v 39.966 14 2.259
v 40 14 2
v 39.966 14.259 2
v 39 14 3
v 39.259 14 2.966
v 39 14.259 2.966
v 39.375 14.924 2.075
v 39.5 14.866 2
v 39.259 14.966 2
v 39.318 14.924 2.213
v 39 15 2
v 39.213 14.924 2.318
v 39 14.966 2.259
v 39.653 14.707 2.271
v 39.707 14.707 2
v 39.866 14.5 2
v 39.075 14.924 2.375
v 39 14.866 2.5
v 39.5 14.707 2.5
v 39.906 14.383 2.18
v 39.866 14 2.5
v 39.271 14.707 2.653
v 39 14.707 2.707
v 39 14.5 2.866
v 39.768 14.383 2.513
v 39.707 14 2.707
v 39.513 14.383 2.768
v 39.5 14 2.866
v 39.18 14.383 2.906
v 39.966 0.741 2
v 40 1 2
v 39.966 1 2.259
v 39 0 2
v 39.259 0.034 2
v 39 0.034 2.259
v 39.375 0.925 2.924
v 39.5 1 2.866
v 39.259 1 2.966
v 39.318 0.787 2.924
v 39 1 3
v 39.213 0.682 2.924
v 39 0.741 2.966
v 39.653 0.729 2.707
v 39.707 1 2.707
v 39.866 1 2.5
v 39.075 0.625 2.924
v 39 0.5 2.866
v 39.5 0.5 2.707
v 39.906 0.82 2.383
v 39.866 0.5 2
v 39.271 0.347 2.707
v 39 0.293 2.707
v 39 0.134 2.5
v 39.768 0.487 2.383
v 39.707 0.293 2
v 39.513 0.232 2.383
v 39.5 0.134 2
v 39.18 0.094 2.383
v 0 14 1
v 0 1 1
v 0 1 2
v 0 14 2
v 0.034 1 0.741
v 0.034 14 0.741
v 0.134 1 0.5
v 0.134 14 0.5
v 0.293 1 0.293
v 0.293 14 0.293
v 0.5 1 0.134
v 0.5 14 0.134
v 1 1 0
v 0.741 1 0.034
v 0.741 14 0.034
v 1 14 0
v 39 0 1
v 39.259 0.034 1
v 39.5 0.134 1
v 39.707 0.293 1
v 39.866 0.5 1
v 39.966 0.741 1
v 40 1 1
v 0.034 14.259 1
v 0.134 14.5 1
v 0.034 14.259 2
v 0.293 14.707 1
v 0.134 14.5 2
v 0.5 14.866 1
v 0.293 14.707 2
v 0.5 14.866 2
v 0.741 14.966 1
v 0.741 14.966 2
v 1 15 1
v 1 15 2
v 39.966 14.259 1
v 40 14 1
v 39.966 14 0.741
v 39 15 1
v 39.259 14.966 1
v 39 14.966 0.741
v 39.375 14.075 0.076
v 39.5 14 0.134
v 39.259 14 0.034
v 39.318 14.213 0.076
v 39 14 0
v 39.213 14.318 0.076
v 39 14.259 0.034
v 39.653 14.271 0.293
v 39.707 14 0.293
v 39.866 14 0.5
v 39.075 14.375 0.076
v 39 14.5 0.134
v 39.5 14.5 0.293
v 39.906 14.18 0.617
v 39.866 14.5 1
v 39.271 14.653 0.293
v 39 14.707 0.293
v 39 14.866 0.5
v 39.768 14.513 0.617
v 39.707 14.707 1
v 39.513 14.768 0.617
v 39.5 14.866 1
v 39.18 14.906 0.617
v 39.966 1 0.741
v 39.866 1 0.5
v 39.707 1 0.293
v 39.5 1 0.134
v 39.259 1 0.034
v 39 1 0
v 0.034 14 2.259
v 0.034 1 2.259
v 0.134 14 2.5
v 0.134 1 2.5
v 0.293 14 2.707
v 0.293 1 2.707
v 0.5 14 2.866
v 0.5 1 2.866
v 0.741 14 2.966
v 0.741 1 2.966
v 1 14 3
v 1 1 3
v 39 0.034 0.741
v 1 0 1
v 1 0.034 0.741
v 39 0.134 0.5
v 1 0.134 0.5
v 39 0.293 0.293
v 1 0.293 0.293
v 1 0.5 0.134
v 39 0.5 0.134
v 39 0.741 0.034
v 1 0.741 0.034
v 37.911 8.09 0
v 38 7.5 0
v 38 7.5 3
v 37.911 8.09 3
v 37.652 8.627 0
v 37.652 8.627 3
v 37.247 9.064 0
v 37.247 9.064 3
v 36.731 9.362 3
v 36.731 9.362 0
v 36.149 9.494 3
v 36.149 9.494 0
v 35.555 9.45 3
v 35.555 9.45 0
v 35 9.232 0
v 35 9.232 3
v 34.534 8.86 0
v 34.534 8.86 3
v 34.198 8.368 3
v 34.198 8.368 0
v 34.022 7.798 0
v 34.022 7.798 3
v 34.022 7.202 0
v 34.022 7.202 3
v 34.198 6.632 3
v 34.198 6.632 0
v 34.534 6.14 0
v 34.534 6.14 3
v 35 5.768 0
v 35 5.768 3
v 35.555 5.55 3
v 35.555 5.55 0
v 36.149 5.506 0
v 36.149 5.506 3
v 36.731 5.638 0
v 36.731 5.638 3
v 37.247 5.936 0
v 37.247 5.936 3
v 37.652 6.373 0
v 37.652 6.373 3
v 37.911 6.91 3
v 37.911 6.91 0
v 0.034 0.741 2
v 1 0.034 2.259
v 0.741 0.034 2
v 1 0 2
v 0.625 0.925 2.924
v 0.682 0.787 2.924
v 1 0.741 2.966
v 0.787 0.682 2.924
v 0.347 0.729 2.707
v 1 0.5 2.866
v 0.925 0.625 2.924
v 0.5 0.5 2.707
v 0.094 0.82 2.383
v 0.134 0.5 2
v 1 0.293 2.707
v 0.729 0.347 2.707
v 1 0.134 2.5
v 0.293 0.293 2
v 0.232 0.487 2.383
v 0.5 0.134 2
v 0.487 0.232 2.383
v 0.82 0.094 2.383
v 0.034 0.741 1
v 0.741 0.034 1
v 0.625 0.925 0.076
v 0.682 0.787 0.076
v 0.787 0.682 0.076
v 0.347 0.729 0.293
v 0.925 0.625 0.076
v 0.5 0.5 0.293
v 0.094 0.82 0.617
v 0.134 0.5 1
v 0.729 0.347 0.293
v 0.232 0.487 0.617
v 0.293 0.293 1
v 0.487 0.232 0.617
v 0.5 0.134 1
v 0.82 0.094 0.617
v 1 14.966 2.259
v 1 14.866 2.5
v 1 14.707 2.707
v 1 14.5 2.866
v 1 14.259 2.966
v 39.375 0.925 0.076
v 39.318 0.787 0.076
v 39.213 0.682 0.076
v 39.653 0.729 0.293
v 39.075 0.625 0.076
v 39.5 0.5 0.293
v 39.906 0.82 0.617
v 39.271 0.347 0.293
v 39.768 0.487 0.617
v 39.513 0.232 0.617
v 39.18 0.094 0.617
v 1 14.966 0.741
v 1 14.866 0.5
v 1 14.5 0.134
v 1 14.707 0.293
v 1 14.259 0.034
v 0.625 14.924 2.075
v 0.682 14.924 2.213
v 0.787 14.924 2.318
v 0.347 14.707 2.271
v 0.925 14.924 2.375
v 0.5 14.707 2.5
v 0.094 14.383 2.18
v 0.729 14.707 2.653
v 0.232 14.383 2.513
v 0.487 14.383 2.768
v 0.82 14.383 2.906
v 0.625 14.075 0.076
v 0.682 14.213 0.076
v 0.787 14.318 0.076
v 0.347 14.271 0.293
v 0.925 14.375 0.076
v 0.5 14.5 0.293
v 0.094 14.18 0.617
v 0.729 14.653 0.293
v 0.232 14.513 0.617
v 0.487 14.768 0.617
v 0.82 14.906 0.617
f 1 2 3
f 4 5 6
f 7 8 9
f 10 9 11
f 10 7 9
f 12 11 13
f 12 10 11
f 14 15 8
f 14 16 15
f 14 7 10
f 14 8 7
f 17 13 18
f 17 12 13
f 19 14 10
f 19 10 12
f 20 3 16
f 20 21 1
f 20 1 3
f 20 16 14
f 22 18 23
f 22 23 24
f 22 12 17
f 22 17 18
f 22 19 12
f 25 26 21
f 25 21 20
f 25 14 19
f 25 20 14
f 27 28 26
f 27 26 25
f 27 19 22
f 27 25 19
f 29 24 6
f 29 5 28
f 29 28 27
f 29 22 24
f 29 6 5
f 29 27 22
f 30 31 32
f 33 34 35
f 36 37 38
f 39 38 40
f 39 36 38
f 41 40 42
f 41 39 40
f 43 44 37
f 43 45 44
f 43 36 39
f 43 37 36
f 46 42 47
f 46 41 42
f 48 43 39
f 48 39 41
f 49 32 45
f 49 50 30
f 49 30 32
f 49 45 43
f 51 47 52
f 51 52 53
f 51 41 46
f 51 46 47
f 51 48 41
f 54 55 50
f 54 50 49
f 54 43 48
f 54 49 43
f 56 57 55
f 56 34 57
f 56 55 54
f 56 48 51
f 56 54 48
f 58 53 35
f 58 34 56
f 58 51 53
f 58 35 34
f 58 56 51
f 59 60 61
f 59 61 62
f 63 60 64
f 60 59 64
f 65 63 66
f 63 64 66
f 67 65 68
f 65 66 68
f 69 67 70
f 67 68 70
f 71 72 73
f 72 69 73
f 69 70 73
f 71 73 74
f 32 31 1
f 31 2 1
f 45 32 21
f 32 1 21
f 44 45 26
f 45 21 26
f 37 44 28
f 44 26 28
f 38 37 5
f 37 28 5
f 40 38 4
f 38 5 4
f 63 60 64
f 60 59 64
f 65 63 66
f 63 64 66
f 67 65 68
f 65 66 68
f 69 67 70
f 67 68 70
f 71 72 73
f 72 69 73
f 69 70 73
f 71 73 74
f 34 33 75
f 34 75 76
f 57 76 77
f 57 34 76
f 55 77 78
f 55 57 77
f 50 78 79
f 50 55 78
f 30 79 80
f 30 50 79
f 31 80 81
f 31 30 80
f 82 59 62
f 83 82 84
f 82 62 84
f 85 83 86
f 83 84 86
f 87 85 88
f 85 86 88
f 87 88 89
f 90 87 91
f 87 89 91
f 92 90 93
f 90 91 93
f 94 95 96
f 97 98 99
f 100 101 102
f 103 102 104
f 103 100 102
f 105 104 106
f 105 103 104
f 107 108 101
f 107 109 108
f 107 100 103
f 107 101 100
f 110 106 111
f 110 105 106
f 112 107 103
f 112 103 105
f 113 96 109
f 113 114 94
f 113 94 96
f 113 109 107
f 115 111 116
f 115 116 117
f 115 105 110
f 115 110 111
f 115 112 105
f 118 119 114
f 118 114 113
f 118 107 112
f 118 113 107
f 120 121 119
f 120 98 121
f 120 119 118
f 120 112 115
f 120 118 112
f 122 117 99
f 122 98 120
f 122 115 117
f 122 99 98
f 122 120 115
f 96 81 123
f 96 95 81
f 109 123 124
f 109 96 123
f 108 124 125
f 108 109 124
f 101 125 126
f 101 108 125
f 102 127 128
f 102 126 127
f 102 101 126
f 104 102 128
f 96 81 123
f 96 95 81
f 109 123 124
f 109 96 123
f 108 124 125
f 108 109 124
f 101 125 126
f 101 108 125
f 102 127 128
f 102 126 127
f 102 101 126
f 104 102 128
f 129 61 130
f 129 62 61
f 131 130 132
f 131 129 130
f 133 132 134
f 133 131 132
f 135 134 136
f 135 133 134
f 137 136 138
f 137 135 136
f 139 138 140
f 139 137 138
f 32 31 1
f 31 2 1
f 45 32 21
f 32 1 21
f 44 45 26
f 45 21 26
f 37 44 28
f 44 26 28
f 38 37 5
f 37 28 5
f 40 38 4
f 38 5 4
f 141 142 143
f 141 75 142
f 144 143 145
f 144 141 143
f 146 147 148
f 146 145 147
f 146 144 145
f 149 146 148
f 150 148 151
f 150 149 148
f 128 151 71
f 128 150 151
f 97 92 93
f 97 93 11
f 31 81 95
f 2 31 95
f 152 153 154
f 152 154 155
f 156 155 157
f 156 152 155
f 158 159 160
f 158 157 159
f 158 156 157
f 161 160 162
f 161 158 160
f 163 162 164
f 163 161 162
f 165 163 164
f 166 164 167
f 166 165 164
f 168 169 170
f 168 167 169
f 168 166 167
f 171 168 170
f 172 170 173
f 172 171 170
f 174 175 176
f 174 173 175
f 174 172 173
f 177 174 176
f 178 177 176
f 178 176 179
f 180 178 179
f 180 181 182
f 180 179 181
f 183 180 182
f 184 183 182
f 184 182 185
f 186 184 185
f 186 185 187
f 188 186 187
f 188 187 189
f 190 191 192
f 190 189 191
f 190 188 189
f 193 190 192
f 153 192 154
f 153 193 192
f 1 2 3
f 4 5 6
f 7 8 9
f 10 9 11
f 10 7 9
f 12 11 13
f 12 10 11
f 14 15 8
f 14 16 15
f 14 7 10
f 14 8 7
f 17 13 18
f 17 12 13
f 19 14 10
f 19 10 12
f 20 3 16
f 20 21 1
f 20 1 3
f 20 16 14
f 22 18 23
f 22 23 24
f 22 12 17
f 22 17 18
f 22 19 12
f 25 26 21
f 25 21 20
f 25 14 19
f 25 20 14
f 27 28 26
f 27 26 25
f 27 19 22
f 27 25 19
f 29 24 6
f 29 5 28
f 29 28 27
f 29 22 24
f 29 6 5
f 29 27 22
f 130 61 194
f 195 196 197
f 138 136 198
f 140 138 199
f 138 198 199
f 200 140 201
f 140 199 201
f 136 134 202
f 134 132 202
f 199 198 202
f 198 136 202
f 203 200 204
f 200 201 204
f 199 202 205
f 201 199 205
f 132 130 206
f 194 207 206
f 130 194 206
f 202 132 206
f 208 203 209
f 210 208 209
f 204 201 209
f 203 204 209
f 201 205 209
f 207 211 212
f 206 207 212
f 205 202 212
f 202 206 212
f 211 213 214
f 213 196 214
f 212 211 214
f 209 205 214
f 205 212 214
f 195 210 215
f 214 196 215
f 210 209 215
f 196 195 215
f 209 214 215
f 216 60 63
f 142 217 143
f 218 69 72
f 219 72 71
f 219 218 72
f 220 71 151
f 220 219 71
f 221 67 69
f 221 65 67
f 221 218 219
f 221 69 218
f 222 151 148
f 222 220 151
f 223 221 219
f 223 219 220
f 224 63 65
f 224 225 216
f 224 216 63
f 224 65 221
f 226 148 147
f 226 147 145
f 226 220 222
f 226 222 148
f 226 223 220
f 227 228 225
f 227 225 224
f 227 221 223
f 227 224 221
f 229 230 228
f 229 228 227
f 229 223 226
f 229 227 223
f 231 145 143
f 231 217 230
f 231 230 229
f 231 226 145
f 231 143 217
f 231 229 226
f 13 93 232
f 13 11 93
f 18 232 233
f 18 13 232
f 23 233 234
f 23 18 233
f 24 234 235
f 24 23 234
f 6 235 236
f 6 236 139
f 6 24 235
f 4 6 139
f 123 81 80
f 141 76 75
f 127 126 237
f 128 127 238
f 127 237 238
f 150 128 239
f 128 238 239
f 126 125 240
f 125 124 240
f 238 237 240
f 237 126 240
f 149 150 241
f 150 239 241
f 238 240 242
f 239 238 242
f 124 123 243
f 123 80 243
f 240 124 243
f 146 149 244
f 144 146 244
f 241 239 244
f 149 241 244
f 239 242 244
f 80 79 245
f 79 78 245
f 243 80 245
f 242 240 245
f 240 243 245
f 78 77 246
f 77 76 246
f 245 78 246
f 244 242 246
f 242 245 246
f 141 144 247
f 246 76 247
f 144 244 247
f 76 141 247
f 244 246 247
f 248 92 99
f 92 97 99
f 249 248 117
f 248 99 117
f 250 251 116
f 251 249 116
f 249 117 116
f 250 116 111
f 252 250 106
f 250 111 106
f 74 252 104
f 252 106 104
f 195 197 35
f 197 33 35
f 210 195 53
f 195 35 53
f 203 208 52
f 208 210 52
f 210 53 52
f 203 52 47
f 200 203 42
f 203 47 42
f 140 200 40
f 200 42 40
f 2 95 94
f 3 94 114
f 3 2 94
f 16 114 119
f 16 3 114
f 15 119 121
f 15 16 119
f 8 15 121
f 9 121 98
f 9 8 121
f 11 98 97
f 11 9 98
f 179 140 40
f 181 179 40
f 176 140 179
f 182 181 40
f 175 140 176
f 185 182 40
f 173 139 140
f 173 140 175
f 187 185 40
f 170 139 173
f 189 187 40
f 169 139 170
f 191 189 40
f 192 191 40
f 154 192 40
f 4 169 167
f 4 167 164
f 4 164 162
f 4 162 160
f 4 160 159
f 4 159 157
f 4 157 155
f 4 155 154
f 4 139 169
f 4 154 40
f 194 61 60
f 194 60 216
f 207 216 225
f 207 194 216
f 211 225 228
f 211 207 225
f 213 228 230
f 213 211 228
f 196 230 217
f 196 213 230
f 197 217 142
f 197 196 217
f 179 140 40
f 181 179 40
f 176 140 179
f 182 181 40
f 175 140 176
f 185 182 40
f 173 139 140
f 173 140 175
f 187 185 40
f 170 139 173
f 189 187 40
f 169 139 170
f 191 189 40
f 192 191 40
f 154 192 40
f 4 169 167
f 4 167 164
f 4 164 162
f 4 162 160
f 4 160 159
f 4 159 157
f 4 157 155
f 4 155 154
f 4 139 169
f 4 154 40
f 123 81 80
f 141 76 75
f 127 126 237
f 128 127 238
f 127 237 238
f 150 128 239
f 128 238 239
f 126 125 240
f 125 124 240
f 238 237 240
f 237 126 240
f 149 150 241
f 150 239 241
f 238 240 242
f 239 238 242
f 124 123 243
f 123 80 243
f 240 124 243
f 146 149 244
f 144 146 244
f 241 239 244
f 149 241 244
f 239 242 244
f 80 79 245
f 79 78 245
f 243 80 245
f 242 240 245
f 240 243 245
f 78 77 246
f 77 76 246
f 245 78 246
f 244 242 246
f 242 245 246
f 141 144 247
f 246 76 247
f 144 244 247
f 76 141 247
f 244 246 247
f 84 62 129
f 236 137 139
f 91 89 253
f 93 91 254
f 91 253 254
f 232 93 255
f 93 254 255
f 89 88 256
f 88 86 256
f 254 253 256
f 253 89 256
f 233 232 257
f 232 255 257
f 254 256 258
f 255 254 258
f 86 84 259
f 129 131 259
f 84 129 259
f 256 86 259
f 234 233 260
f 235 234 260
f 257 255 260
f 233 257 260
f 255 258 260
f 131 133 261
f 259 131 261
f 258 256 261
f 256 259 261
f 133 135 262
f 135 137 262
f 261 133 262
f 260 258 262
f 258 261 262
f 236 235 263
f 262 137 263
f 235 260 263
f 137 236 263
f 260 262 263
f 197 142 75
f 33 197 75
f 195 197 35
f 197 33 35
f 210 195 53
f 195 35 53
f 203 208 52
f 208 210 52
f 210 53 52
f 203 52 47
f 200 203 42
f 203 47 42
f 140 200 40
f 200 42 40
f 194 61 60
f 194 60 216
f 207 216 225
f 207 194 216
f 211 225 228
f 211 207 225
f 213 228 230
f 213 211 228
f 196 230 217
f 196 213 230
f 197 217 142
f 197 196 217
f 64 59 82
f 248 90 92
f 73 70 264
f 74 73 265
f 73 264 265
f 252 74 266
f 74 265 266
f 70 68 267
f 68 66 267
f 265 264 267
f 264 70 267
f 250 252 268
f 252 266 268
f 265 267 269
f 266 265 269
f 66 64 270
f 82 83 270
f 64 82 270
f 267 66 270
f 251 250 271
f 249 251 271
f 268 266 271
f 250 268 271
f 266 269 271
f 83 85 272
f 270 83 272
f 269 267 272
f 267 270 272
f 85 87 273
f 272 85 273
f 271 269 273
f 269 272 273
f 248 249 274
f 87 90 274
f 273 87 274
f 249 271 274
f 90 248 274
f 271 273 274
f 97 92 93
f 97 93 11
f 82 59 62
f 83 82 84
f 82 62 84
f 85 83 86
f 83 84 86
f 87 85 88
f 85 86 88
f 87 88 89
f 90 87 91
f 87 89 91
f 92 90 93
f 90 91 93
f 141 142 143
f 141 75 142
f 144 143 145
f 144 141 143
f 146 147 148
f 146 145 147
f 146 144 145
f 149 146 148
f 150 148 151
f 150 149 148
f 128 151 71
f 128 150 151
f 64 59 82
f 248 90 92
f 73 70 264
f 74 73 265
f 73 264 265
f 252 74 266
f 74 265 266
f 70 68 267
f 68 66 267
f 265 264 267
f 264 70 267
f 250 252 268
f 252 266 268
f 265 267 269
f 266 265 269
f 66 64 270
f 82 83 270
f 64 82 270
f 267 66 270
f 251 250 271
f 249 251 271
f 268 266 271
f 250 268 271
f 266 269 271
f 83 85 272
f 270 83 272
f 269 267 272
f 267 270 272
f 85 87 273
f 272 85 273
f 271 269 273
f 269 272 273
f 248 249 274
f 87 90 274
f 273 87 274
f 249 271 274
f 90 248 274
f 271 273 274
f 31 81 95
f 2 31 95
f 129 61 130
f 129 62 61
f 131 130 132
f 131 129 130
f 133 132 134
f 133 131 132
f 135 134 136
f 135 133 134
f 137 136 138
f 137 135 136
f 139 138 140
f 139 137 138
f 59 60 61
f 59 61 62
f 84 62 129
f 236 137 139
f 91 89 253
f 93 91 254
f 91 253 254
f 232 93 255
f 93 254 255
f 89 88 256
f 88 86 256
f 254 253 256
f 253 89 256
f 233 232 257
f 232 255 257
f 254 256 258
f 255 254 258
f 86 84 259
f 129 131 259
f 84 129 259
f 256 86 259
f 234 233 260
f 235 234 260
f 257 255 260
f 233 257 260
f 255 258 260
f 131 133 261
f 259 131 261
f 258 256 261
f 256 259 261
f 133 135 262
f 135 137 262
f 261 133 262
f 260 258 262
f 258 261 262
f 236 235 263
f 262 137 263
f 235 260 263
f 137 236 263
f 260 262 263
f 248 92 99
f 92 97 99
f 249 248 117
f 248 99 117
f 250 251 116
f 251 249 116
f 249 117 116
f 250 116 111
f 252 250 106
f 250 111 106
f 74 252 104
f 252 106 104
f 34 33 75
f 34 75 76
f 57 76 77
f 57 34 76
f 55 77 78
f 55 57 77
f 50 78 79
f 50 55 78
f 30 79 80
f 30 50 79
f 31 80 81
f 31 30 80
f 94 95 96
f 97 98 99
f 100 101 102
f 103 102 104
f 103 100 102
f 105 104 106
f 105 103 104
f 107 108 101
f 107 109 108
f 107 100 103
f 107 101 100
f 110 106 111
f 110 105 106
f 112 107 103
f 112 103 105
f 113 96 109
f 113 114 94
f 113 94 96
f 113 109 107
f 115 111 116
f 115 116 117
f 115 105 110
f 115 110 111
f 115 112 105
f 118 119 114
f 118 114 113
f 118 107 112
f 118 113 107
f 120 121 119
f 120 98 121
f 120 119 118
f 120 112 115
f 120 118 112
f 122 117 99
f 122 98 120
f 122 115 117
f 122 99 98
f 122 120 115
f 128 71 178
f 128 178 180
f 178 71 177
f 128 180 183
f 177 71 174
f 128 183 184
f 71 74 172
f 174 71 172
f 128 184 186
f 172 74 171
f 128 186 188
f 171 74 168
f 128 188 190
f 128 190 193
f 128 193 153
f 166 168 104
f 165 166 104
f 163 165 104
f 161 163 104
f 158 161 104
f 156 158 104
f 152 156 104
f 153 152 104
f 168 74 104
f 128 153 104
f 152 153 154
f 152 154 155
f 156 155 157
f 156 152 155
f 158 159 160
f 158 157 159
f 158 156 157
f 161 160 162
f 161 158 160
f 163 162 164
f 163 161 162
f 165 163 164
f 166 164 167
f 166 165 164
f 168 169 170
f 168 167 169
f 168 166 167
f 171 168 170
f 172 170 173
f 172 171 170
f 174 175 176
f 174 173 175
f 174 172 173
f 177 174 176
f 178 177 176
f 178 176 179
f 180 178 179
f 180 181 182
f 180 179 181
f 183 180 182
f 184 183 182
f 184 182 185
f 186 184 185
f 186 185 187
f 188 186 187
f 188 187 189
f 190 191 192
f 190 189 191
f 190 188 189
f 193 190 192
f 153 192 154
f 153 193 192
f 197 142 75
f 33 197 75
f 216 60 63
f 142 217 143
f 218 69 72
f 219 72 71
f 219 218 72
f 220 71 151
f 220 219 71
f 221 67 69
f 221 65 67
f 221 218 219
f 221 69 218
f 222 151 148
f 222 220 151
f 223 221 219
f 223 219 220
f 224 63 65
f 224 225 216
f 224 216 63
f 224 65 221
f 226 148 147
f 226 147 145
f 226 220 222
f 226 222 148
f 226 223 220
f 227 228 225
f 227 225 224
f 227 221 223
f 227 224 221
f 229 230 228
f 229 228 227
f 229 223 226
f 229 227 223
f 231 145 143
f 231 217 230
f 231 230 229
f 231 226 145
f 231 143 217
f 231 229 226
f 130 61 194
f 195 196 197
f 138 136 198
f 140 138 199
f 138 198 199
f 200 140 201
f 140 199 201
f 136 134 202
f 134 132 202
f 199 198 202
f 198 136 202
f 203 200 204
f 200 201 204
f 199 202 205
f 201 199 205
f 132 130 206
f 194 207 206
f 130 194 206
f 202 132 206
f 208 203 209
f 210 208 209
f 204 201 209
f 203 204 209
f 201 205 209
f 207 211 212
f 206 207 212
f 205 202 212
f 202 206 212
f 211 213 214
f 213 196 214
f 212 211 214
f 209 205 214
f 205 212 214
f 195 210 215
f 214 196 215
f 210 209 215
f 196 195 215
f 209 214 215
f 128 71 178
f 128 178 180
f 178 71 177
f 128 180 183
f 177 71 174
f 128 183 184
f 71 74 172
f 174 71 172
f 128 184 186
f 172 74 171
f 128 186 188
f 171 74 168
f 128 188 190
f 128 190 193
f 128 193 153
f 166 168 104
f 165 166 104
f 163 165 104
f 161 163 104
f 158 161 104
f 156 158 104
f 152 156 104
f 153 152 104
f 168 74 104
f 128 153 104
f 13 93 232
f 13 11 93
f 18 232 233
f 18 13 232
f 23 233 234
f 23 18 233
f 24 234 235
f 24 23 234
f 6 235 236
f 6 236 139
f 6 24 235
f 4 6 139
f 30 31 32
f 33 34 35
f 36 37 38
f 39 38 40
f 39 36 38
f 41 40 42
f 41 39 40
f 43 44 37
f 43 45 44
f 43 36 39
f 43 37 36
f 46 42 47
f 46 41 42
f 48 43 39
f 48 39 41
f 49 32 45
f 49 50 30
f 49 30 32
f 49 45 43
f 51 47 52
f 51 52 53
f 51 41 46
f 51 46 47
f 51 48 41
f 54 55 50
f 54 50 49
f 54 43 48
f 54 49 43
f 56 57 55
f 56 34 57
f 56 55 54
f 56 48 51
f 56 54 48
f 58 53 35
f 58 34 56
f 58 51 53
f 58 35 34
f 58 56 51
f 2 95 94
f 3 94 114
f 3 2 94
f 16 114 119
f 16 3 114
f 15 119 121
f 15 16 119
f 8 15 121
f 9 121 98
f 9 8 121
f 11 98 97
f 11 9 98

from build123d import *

# Parameters (mm, degrees)
CYLINDER_R     = 2
CYLINDER_DEPTH = 10
BOX_W          = 40
BOX_H          = 15
BOX_DEPTH      = 3
FILLET_R       = 1


with BuildPart() as cilindro:
    # Cylinder → Cylinder (new body)
    with BuildSketch(Plane(origin=(36, 7.5, -3), x_dir=(1, 0, 0), z_dir=(0, 0, 1))):
        Circle(CYLINDER_R)
    extrude(amount=CYLINDER_DEPTH)


with BuildPart() as fillet_body:
    # Box → Box (new body)
    with BuildSketch(Plane.XY):
        with Locations((20, 7.5)):
            Rectangle(BOX_W, BOX_H)
    extrude(amount=BOX_DEPTH)

    # Fillet
    fillet_edges = [fillet_body.edges().sort_by_distance(p)[0] for p in [
        (0, 0, 1.5),
        (0, 7.5, 3),
        (0, 15, 1.5),
        (0, 7.5, 0),
        (40, 0, 1.5),
        (40, 7.5, 3),
        (40, 15, 1.5),
        (40, 7.5, 0),
        (20, 0, 0),
        (20, 0, 3),
        (20, 15, 0),
        (20, 15, 3),
    ]]
    fillet(fillet_edges, radius=FILLET_R)


with BuildPart() as cut:
    # Cut base: copy of Fillet body
    add(fillet_body.part)

    # Cut: cut Cilindro
    add(cilindro.part, mode=Mode.SUBTRACT)


with BuildPart() as cut002:
    # Cut002 base: copy of Fillet body
    add(fillet_body.part)

    # Cut002: cut Cilindro
    add(cilindro.part, mode=Mode.SUBTRACT)


solid = Compound([cut.part, cut002.part])
